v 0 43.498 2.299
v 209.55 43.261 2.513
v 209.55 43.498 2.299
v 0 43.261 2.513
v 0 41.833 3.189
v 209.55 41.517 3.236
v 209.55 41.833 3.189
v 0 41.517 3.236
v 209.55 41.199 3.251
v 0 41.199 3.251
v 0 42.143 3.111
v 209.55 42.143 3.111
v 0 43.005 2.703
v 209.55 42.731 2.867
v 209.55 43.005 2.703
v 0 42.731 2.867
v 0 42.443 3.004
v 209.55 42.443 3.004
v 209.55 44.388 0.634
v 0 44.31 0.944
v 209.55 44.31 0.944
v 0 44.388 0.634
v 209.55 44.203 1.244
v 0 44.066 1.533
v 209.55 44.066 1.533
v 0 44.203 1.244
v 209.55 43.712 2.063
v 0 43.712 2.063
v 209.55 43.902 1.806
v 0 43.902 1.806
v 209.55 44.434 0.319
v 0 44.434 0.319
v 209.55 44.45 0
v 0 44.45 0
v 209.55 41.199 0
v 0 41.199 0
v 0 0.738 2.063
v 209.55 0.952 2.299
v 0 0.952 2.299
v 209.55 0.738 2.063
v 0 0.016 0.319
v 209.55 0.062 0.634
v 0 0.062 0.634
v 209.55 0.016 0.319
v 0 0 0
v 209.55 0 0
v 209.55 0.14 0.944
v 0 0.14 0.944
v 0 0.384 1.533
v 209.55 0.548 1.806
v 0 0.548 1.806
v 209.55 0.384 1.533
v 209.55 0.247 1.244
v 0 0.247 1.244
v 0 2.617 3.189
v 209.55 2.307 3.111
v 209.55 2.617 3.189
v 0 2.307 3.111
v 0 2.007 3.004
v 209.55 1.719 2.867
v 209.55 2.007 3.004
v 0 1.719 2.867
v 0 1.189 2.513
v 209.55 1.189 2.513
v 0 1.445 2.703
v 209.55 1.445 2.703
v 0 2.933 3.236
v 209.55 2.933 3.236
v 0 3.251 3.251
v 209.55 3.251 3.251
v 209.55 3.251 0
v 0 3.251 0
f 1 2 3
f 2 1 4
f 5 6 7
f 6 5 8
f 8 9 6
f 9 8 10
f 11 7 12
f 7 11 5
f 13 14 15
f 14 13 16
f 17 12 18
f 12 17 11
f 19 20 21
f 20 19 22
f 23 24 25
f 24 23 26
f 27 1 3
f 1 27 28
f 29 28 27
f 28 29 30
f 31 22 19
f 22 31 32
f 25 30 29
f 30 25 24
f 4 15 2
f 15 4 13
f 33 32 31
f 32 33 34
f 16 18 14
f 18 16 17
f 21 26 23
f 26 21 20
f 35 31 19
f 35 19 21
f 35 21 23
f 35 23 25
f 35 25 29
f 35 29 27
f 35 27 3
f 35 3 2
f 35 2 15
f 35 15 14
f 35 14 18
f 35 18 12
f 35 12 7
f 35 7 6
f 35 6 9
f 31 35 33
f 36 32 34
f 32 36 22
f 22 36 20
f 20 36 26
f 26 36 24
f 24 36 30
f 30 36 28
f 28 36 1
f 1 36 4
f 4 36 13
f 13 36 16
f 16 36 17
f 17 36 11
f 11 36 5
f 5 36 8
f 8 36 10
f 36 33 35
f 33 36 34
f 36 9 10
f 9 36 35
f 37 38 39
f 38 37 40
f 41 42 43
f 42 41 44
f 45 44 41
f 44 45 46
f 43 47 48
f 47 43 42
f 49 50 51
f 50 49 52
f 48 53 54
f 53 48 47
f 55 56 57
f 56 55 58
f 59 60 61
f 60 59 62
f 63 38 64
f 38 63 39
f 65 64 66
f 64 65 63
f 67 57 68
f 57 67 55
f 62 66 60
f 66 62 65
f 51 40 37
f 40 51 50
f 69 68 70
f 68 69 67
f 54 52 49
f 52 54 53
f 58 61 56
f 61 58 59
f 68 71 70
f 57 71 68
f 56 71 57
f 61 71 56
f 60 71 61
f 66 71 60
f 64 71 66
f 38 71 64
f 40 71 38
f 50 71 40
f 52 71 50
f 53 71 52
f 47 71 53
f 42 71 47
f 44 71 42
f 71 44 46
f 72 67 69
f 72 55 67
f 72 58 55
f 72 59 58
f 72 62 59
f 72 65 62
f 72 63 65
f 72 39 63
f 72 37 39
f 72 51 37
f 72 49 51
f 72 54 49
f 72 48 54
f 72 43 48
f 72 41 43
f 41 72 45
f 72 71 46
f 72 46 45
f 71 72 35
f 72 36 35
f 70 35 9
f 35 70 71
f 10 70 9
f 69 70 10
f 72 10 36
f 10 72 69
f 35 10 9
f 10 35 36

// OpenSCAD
//
// We need two of those
//

$fn = 64;

$in     = 25.4; // everything in inches

$length = 8.25  * $in;
$height = 0.128 * $in;
$width  = 1.75  * $in;

module quarter( height, radius ) {
     intersection() {
        cylinder( h = height, r = radius );
        cube( [ radius, radius, height ] );
    }
}
union() {
    translate( [ 0, $height, 0 ] ) {
        cube( [ $length, $width - 2 * $height, $height ] );
    }

    translate( [ $length, $width-$height, 0 ] )
    rotate( [ 0, -90, 0 ] ) {
        quarter( height = $length, radius = $height );
    }
    translate( [ $length, $height, 0 ] )
    rotate( [ 90, 0, 0 ] )
    rotate( [ 0, -90, 0 ] ) {
        quarter( height = $length, radius = $height );
    }
}
